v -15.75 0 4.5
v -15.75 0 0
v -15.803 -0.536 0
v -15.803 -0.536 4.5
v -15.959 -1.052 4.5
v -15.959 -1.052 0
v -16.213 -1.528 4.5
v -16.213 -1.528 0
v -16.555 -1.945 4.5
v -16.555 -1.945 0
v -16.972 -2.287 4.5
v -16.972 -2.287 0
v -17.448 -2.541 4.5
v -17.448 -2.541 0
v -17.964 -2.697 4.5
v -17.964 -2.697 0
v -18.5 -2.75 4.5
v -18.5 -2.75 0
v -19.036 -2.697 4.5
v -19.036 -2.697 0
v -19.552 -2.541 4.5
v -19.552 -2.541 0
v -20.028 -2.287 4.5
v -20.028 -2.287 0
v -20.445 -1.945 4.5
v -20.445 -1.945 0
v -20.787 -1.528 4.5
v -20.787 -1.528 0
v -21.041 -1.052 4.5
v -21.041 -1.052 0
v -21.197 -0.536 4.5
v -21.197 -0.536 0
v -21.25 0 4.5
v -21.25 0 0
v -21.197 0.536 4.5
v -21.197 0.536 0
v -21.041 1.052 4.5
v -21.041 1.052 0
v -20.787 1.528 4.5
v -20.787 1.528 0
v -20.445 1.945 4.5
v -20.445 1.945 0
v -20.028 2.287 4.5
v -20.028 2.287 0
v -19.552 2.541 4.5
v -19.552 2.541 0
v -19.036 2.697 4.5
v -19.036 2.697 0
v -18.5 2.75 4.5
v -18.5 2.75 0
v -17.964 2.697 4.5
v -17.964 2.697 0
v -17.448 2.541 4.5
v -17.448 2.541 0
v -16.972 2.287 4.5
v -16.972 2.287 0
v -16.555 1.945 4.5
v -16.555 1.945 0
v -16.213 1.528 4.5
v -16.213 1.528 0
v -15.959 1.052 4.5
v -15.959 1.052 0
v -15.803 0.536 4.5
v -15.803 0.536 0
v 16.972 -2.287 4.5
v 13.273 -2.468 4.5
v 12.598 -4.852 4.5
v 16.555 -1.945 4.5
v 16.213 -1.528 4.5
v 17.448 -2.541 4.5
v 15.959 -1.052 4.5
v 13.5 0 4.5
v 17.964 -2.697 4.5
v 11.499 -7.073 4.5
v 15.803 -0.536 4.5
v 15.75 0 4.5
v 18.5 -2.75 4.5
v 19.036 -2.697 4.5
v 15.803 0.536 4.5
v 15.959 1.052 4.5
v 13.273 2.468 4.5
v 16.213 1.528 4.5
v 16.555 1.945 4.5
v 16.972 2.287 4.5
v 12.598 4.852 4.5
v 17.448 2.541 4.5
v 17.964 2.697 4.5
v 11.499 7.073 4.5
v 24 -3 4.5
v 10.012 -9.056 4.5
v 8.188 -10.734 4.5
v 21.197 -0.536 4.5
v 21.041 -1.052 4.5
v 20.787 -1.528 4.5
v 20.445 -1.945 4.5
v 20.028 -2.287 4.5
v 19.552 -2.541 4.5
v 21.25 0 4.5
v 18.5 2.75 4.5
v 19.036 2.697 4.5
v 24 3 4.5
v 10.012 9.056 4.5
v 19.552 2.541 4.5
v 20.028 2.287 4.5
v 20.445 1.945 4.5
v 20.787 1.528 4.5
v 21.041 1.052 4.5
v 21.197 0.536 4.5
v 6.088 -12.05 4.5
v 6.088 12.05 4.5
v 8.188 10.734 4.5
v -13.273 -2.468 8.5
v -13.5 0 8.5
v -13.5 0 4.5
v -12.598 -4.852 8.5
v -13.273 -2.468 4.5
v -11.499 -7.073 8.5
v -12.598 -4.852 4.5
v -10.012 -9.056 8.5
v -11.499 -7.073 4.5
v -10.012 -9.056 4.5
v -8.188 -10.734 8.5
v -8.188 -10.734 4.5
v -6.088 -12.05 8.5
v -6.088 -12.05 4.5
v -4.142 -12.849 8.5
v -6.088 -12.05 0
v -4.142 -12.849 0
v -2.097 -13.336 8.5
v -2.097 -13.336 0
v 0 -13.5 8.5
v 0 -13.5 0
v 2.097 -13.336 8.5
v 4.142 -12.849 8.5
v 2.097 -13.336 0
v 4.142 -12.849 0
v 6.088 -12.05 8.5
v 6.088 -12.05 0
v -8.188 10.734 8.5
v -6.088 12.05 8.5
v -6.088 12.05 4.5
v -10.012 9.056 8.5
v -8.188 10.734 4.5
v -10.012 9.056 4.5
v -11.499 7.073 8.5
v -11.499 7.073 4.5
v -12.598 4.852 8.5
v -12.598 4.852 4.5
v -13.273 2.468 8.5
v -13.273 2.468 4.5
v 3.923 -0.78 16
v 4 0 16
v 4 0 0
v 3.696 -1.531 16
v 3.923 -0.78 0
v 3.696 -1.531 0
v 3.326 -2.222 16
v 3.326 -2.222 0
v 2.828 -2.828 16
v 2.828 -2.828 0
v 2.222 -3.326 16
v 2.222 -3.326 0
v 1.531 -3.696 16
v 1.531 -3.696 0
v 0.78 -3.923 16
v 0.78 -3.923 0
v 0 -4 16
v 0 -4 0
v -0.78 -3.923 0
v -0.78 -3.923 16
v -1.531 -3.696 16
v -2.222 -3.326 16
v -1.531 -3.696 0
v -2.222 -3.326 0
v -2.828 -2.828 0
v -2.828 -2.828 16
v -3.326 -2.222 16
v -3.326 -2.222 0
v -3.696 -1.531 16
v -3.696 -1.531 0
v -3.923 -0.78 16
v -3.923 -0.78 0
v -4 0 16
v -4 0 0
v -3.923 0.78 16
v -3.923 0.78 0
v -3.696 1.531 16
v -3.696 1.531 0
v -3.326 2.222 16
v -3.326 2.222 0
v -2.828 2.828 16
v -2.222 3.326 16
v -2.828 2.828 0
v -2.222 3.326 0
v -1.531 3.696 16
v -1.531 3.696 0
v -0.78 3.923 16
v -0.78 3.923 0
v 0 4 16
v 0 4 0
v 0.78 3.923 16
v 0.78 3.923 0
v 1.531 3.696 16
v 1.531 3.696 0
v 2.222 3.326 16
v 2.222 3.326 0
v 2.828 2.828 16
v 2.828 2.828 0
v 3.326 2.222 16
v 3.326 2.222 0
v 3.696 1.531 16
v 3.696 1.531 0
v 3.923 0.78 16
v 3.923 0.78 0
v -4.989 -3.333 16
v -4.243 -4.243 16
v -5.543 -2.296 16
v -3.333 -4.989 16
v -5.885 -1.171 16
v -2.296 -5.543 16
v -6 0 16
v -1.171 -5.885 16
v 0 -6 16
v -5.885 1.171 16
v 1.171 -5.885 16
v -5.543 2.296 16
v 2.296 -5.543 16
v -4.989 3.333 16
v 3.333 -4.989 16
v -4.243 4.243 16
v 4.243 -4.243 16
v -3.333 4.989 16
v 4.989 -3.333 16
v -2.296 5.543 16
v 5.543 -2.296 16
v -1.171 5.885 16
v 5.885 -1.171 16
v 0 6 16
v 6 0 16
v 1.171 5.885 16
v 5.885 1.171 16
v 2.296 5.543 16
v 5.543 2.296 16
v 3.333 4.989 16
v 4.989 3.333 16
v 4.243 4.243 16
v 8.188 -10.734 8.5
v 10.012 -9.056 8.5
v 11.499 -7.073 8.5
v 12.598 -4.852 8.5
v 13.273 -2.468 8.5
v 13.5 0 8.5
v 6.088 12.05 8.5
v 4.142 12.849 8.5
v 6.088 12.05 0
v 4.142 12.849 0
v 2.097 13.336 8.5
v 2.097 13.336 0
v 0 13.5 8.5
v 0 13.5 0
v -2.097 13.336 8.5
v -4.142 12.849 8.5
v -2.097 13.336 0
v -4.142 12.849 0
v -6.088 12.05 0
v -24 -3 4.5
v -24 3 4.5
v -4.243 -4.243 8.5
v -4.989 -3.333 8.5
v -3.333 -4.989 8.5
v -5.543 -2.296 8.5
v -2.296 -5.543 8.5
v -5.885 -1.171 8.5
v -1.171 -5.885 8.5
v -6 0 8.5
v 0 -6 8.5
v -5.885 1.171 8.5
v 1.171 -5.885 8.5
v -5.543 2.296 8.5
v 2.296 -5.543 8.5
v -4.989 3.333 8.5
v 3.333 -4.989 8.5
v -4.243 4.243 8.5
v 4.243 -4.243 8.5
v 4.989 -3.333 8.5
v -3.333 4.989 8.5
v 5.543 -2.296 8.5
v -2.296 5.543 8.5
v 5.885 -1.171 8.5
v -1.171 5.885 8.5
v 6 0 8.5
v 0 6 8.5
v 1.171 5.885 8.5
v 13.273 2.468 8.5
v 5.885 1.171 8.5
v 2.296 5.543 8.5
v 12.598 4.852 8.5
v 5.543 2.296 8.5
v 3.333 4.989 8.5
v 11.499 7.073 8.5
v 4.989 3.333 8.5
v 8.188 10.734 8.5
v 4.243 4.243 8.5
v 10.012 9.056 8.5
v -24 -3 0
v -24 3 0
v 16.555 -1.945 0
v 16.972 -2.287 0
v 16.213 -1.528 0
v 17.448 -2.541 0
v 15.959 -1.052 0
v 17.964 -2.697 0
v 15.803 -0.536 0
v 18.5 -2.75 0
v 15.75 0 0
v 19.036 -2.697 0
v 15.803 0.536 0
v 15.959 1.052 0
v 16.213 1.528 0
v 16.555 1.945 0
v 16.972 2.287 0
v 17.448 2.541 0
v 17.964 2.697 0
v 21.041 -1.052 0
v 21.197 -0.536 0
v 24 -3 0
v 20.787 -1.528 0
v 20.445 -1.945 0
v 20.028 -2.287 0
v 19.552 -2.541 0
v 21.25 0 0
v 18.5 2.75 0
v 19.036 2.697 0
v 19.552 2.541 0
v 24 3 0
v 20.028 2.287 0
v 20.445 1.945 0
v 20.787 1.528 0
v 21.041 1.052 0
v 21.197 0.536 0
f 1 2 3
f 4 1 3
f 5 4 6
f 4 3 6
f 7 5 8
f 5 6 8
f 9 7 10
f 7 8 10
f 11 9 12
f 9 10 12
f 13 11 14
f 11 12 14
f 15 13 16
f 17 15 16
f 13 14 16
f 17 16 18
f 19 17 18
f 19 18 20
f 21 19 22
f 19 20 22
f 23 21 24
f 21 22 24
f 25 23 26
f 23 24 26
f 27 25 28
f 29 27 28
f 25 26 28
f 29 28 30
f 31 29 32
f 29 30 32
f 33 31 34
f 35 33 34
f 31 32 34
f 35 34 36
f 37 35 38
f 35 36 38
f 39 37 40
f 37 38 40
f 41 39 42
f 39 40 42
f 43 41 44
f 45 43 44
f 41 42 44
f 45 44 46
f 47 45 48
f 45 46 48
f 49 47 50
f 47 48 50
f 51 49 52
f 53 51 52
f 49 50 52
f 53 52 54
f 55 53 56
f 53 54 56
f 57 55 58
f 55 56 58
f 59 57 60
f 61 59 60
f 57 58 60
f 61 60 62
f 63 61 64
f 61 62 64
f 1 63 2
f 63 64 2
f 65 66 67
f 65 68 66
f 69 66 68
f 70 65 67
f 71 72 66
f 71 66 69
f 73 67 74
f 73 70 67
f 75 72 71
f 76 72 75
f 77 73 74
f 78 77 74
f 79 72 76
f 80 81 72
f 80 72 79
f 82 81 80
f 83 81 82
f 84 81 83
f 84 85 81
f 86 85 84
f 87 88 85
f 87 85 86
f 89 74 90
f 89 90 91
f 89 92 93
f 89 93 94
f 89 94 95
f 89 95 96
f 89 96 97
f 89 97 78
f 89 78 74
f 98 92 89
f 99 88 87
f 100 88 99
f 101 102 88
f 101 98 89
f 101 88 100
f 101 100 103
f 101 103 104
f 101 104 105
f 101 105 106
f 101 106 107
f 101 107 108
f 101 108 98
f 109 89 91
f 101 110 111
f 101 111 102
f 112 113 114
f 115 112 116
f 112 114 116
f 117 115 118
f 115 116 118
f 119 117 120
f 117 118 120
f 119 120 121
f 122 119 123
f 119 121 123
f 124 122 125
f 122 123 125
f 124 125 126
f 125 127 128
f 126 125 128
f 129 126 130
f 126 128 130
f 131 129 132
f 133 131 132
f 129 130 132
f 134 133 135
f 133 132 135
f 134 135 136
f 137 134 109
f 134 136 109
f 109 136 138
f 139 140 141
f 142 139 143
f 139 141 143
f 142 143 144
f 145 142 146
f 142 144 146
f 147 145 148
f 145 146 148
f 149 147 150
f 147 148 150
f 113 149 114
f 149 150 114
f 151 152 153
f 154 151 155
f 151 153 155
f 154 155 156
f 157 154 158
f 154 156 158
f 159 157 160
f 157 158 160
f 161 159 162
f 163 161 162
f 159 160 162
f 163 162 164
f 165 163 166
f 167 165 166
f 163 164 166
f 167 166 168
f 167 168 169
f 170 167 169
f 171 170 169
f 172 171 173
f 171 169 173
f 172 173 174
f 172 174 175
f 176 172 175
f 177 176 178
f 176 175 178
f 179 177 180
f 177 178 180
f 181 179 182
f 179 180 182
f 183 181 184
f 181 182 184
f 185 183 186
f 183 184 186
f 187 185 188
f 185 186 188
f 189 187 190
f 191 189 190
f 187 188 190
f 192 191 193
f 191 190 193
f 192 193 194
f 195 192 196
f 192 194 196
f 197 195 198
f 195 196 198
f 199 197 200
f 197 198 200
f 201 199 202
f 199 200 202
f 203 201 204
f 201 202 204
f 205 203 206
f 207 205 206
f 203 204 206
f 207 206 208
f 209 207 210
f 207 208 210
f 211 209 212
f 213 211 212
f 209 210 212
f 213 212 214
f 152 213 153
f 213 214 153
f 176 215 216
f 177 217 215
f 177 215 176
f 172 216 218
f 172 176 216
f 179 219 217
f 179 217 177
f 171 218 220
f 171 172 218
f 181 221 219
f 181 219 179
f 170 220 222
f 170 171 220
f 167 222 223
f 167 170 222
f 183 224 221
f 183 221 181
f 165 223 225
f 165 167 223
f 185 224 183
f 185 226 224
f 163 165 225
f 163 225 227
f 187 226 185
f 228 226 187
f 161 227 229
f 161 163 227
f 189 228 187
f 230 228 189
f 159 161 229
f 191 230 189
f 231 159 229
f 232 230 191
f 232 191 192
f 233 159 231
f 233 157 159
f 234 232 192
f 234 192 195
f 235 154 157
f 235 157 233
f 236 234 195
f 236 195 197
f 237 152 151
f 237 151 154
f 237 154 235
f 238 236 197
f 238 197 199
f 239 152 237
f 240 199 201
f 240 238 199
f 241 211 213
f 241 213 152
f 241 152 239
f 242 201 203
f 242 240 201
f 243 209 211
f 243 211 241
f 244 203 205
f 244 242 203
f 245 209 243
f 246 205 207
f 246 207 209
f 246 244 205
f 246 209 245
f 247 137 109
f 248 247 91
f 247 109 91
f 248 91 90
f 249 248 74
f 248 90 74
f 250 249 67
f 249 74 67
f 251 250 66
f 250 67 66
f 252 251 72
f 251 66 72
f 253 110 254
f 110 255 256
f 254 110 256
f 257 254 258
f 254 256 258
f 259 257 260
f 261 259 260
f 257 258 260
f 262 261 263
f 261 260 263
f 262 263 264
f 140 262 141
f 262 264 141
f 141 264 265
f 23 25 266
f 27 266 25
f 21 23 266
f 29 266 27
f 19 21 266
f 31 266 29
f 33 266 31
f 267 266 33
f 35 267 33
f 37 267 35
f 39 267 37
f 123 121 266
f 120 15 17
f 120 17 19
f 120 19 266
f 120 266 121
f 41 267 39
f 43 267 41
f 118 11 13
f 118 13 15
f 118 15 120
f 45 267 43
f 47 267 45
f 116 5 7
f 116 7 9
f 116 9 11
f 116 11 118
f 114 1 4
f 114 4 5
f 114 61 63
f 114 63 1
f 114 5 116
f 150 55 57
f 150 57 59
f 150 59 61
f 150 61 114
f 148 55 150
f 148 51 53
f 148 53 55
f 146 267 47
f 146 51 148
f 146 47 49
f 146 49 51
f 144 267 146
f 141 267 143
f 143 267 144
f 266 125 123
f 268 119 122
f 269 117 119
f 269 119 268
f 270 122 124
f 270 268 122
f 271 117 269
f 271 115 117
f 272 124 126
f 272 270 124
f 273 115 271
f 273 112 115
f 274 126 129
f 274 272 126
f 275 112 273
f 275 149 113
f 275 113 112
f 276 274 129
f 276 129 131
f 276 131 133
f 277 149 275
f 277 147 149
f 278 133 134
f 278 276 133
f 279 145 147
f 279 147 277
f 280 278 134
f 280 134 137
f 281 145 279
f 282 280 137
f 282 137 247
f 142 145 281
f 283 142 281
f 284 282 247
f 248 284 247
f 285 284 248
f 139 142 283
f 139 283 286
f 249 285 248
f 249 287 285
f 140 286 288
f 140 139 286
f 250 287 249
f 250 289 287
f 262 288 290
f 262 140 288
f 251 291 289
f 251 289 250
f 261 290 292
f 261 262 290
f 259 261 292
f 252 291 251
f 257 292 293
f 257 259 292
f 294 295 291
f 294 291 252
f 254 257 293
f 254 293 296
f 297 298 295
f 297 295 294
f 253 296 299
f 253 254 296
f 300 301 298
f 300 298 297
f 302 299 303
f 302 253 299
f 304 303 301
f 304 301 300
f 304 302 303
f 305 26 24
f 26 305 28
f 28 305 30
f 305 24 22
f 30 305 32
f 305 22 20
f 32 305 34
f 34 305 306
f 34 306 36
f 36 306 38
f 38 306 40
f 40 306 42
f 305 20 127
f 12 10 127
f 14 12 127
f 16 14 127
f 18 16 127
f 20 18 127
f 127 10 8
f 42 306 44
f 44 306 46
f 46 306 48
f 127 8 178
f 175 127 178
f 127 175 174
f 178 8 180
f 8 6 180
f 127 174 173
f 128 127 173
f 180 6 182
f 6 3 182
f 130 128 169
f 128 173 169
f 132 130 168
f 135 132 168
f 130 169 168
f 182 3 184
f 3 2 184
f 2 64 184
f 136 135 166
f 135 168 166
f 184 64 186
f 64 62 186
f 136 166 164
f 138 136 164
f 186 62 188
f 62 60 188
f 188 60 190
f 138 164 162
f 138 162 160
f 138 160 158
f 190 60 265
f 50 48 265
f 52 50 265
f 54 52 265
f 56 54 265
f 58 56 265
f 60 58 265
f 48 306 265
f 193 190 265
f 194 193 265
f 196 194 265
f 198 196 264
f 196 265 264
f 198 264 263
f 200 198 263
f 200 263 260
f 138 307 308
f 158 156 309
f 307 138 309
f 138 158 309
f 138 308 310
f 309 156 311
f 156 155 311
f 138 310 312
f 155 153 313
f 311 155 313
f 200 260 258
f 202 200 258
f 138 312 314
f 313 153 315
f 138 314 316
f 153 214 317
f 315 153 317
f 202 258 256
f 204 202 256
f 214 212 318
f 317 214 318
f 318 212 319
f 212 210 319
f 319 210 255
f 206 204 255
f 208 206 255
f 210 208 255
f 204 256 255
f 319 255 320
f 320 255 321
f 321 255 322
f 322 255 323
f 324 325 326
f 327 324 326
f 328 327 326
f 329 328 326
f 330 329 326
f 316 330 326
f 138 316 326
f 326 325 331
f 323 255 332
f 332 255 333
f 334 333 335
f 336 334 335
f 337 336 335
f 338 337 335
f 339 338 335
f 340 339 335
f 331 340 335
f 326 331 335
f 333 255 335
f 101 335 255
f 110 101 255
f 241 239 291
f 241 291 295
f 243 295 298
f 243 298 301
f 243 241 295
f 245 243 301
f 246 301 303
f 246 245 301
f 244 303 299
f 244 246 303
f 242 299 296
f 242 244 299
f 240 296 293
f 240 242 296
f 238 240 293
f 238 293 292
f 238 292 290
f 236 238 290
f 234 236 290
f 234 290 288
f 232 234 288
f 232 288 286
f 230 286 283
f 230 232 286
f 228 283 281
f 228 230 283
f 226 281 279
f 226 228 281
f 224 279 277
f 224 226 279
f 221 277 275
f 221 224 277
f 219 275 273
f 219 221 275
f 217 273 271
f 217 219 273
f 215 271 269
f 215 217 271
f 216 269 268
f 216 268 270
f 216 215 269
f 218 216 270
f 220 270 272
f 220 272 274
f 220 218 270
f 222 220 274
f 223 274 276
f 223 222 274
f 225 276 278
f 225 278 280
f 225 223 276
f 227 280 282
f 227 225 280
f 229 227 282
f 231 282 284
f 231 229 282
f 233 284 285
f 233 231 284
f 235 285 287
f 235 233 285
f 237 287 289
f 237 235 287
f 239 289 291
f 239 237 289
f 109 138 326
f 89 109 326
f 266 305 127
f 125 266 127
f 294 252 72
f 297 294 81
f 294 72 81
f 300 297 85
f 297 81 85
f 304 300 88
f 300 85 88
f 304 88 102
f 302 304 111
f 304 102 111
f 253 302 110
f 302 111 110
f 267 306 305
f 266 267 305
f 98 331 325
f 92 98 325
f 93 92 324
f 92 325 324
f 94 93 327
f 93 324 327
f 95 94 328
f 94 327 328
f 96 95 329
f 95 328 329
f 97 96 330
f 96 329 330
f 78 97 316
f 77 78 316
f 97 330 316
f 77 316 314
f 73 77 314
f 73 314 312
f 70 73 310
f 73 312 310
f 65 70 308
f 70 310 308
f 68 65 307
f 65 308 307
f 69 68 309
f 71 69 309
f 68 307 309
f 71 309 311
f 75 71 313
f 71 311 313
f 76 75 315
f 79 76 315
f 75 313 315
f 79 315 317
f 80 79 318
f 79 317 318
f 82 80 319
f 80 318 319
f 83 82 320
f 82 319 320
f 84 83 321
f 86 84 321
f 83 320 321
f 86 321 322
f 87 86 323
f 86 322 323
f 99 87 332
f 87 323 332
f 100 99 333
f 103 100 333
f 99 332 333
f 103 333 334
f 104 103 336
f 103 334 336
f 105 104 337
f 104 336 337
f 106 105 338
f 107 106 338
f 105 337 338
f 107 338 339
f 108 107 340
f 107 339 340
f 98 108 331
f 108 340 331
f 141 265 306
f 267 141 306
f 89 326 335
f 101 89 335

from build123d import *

# Parameters (mm, degrees)
F1_DEPTH = 16
F2_DEPTH = 4.5
F3_R     = 13.5
F3_R_2   = 6
F4_DEPTH = 7.5


with BuildPart() as f1:
    # F0 (on Top) → F1 (new body)
    with BuildSketch(Plane.XY):
        with BuildLine():
            Line((4, 0), (13.5, 0))
            ThreePointArc((13.5, 0), (11.4985218419, 7.0734712448), (6.0875562295, 12.0495501639))
            ThreePointArc((6.0875562295, 12.0495501639), (0, 13.5), (-6.0875562295, 12.0495501639))
            ThreePointArc((-6.0875562295, 12.0495501639), (-11.4985218419, 7.0734712448), (-13.5, 0))
            Line((-13.5, 0), (-4, 0))
            ThreePointArc((-4, 0), (0, 4), (4, 0))
        make_face()
        with BuildLine():
            ThreePointArc((6.0875562295, -12.0495501639), (11.4985218419, -7.0734712448), (13.5, 0))
            Line((13.5, 0), (4, 0))
            ThreePointArc((4, 0), (0, -4), (-4, 0))
            Line((-4, 0), (-13.5, 0))
            ThreePointArc((-13.5, 0), (-11.4985218419, -7.0734712448), (-6.0875562295, -12.0495501639))
            ThreePointArc((-6.0875562295, -12.0495501639), (0, -13.5), (6.0875562295, -12.0495501639))
        make_face()
    extrude(amount=F1_DEPTH)

    # F0 (on Top) → F2 (join)
    with BuildSketch(Plane.XY):
        with BuildLine():
            ThreePointArc((-13.5, 0), (-11.4985218419, 7.0734712448), (-6.0875562295, 12.0495501639))
            Line((-6.0875562295, 12.0495501639), (-24, 3))
            Line((-24, 3), (-24, 0))
            Line((-24, 0), (-21.25, 0))
            ThreePointArc((-21.25, 0), (-18.5, 2.75), (-15.75, 0))
            Line((-15.75, 0), (-13.5, 0))
        make_face()
        with BuildLine():
            Line((-24, -3), (-6.0875562295, -12.0495501639))
            ThreePointArc((-6.0875562295, -12.0495501639), (-11.4985218419, -7.0734712448), (-13.5, 0))
            Line((-13.5, 0), (-15.75, 0))
            ThreePointArc((-15.75, 0), (-18.5, -2.75), (-21.25, 0))
            Line((-21.25, 0), (-24, 0))
            Line((-24, 0), (-24, -3))
        make_face()
        with BuildLine():
            ThreePointArc((6.0875562295, 12.0495501639), (11.4985218419, 7.0734712448), (13.5, 0))
            Line((13.5, 0), (15.75, 0))
            ThreePointArc((15.75, 0), (18.5, 2.75), (21.25, 0))
            Line((21.25, 0), (24, 0))
            Line((24, 0), (24, 3))
            Line((24, 3), (6.0875562295, 12.0495501639))
        make_face()
        with BuildLine():
            Line((15.75, 0), (13.5, 0))
            ThreePointArc((13.5, 0), (11.4985218419, -7.0734712448), (6.0875562295, -12.0495501639))
            Line((6.0875562295, -12.0495501639), (24, -3))
            Line((24, -3), (24, 0))
            Line((24, 0), (21.25, 0))
            ThreePointArc((21.25, 0), (18.5, -2.75), (15.75, 0))
        make_face()
    extrude(amount=F2_DEPTH)

    # F3 (on face) → F4 (cut)
    with BuildSketch(Plane.XY.offset(16)):
        Circle(F3_R)
        Circle(F3_R_2, mode=Mode.SUBTRACT)
    extrude(amount=-F4_DEPTH, mode=Mode.SUBTRACT)


solid = f1.part
